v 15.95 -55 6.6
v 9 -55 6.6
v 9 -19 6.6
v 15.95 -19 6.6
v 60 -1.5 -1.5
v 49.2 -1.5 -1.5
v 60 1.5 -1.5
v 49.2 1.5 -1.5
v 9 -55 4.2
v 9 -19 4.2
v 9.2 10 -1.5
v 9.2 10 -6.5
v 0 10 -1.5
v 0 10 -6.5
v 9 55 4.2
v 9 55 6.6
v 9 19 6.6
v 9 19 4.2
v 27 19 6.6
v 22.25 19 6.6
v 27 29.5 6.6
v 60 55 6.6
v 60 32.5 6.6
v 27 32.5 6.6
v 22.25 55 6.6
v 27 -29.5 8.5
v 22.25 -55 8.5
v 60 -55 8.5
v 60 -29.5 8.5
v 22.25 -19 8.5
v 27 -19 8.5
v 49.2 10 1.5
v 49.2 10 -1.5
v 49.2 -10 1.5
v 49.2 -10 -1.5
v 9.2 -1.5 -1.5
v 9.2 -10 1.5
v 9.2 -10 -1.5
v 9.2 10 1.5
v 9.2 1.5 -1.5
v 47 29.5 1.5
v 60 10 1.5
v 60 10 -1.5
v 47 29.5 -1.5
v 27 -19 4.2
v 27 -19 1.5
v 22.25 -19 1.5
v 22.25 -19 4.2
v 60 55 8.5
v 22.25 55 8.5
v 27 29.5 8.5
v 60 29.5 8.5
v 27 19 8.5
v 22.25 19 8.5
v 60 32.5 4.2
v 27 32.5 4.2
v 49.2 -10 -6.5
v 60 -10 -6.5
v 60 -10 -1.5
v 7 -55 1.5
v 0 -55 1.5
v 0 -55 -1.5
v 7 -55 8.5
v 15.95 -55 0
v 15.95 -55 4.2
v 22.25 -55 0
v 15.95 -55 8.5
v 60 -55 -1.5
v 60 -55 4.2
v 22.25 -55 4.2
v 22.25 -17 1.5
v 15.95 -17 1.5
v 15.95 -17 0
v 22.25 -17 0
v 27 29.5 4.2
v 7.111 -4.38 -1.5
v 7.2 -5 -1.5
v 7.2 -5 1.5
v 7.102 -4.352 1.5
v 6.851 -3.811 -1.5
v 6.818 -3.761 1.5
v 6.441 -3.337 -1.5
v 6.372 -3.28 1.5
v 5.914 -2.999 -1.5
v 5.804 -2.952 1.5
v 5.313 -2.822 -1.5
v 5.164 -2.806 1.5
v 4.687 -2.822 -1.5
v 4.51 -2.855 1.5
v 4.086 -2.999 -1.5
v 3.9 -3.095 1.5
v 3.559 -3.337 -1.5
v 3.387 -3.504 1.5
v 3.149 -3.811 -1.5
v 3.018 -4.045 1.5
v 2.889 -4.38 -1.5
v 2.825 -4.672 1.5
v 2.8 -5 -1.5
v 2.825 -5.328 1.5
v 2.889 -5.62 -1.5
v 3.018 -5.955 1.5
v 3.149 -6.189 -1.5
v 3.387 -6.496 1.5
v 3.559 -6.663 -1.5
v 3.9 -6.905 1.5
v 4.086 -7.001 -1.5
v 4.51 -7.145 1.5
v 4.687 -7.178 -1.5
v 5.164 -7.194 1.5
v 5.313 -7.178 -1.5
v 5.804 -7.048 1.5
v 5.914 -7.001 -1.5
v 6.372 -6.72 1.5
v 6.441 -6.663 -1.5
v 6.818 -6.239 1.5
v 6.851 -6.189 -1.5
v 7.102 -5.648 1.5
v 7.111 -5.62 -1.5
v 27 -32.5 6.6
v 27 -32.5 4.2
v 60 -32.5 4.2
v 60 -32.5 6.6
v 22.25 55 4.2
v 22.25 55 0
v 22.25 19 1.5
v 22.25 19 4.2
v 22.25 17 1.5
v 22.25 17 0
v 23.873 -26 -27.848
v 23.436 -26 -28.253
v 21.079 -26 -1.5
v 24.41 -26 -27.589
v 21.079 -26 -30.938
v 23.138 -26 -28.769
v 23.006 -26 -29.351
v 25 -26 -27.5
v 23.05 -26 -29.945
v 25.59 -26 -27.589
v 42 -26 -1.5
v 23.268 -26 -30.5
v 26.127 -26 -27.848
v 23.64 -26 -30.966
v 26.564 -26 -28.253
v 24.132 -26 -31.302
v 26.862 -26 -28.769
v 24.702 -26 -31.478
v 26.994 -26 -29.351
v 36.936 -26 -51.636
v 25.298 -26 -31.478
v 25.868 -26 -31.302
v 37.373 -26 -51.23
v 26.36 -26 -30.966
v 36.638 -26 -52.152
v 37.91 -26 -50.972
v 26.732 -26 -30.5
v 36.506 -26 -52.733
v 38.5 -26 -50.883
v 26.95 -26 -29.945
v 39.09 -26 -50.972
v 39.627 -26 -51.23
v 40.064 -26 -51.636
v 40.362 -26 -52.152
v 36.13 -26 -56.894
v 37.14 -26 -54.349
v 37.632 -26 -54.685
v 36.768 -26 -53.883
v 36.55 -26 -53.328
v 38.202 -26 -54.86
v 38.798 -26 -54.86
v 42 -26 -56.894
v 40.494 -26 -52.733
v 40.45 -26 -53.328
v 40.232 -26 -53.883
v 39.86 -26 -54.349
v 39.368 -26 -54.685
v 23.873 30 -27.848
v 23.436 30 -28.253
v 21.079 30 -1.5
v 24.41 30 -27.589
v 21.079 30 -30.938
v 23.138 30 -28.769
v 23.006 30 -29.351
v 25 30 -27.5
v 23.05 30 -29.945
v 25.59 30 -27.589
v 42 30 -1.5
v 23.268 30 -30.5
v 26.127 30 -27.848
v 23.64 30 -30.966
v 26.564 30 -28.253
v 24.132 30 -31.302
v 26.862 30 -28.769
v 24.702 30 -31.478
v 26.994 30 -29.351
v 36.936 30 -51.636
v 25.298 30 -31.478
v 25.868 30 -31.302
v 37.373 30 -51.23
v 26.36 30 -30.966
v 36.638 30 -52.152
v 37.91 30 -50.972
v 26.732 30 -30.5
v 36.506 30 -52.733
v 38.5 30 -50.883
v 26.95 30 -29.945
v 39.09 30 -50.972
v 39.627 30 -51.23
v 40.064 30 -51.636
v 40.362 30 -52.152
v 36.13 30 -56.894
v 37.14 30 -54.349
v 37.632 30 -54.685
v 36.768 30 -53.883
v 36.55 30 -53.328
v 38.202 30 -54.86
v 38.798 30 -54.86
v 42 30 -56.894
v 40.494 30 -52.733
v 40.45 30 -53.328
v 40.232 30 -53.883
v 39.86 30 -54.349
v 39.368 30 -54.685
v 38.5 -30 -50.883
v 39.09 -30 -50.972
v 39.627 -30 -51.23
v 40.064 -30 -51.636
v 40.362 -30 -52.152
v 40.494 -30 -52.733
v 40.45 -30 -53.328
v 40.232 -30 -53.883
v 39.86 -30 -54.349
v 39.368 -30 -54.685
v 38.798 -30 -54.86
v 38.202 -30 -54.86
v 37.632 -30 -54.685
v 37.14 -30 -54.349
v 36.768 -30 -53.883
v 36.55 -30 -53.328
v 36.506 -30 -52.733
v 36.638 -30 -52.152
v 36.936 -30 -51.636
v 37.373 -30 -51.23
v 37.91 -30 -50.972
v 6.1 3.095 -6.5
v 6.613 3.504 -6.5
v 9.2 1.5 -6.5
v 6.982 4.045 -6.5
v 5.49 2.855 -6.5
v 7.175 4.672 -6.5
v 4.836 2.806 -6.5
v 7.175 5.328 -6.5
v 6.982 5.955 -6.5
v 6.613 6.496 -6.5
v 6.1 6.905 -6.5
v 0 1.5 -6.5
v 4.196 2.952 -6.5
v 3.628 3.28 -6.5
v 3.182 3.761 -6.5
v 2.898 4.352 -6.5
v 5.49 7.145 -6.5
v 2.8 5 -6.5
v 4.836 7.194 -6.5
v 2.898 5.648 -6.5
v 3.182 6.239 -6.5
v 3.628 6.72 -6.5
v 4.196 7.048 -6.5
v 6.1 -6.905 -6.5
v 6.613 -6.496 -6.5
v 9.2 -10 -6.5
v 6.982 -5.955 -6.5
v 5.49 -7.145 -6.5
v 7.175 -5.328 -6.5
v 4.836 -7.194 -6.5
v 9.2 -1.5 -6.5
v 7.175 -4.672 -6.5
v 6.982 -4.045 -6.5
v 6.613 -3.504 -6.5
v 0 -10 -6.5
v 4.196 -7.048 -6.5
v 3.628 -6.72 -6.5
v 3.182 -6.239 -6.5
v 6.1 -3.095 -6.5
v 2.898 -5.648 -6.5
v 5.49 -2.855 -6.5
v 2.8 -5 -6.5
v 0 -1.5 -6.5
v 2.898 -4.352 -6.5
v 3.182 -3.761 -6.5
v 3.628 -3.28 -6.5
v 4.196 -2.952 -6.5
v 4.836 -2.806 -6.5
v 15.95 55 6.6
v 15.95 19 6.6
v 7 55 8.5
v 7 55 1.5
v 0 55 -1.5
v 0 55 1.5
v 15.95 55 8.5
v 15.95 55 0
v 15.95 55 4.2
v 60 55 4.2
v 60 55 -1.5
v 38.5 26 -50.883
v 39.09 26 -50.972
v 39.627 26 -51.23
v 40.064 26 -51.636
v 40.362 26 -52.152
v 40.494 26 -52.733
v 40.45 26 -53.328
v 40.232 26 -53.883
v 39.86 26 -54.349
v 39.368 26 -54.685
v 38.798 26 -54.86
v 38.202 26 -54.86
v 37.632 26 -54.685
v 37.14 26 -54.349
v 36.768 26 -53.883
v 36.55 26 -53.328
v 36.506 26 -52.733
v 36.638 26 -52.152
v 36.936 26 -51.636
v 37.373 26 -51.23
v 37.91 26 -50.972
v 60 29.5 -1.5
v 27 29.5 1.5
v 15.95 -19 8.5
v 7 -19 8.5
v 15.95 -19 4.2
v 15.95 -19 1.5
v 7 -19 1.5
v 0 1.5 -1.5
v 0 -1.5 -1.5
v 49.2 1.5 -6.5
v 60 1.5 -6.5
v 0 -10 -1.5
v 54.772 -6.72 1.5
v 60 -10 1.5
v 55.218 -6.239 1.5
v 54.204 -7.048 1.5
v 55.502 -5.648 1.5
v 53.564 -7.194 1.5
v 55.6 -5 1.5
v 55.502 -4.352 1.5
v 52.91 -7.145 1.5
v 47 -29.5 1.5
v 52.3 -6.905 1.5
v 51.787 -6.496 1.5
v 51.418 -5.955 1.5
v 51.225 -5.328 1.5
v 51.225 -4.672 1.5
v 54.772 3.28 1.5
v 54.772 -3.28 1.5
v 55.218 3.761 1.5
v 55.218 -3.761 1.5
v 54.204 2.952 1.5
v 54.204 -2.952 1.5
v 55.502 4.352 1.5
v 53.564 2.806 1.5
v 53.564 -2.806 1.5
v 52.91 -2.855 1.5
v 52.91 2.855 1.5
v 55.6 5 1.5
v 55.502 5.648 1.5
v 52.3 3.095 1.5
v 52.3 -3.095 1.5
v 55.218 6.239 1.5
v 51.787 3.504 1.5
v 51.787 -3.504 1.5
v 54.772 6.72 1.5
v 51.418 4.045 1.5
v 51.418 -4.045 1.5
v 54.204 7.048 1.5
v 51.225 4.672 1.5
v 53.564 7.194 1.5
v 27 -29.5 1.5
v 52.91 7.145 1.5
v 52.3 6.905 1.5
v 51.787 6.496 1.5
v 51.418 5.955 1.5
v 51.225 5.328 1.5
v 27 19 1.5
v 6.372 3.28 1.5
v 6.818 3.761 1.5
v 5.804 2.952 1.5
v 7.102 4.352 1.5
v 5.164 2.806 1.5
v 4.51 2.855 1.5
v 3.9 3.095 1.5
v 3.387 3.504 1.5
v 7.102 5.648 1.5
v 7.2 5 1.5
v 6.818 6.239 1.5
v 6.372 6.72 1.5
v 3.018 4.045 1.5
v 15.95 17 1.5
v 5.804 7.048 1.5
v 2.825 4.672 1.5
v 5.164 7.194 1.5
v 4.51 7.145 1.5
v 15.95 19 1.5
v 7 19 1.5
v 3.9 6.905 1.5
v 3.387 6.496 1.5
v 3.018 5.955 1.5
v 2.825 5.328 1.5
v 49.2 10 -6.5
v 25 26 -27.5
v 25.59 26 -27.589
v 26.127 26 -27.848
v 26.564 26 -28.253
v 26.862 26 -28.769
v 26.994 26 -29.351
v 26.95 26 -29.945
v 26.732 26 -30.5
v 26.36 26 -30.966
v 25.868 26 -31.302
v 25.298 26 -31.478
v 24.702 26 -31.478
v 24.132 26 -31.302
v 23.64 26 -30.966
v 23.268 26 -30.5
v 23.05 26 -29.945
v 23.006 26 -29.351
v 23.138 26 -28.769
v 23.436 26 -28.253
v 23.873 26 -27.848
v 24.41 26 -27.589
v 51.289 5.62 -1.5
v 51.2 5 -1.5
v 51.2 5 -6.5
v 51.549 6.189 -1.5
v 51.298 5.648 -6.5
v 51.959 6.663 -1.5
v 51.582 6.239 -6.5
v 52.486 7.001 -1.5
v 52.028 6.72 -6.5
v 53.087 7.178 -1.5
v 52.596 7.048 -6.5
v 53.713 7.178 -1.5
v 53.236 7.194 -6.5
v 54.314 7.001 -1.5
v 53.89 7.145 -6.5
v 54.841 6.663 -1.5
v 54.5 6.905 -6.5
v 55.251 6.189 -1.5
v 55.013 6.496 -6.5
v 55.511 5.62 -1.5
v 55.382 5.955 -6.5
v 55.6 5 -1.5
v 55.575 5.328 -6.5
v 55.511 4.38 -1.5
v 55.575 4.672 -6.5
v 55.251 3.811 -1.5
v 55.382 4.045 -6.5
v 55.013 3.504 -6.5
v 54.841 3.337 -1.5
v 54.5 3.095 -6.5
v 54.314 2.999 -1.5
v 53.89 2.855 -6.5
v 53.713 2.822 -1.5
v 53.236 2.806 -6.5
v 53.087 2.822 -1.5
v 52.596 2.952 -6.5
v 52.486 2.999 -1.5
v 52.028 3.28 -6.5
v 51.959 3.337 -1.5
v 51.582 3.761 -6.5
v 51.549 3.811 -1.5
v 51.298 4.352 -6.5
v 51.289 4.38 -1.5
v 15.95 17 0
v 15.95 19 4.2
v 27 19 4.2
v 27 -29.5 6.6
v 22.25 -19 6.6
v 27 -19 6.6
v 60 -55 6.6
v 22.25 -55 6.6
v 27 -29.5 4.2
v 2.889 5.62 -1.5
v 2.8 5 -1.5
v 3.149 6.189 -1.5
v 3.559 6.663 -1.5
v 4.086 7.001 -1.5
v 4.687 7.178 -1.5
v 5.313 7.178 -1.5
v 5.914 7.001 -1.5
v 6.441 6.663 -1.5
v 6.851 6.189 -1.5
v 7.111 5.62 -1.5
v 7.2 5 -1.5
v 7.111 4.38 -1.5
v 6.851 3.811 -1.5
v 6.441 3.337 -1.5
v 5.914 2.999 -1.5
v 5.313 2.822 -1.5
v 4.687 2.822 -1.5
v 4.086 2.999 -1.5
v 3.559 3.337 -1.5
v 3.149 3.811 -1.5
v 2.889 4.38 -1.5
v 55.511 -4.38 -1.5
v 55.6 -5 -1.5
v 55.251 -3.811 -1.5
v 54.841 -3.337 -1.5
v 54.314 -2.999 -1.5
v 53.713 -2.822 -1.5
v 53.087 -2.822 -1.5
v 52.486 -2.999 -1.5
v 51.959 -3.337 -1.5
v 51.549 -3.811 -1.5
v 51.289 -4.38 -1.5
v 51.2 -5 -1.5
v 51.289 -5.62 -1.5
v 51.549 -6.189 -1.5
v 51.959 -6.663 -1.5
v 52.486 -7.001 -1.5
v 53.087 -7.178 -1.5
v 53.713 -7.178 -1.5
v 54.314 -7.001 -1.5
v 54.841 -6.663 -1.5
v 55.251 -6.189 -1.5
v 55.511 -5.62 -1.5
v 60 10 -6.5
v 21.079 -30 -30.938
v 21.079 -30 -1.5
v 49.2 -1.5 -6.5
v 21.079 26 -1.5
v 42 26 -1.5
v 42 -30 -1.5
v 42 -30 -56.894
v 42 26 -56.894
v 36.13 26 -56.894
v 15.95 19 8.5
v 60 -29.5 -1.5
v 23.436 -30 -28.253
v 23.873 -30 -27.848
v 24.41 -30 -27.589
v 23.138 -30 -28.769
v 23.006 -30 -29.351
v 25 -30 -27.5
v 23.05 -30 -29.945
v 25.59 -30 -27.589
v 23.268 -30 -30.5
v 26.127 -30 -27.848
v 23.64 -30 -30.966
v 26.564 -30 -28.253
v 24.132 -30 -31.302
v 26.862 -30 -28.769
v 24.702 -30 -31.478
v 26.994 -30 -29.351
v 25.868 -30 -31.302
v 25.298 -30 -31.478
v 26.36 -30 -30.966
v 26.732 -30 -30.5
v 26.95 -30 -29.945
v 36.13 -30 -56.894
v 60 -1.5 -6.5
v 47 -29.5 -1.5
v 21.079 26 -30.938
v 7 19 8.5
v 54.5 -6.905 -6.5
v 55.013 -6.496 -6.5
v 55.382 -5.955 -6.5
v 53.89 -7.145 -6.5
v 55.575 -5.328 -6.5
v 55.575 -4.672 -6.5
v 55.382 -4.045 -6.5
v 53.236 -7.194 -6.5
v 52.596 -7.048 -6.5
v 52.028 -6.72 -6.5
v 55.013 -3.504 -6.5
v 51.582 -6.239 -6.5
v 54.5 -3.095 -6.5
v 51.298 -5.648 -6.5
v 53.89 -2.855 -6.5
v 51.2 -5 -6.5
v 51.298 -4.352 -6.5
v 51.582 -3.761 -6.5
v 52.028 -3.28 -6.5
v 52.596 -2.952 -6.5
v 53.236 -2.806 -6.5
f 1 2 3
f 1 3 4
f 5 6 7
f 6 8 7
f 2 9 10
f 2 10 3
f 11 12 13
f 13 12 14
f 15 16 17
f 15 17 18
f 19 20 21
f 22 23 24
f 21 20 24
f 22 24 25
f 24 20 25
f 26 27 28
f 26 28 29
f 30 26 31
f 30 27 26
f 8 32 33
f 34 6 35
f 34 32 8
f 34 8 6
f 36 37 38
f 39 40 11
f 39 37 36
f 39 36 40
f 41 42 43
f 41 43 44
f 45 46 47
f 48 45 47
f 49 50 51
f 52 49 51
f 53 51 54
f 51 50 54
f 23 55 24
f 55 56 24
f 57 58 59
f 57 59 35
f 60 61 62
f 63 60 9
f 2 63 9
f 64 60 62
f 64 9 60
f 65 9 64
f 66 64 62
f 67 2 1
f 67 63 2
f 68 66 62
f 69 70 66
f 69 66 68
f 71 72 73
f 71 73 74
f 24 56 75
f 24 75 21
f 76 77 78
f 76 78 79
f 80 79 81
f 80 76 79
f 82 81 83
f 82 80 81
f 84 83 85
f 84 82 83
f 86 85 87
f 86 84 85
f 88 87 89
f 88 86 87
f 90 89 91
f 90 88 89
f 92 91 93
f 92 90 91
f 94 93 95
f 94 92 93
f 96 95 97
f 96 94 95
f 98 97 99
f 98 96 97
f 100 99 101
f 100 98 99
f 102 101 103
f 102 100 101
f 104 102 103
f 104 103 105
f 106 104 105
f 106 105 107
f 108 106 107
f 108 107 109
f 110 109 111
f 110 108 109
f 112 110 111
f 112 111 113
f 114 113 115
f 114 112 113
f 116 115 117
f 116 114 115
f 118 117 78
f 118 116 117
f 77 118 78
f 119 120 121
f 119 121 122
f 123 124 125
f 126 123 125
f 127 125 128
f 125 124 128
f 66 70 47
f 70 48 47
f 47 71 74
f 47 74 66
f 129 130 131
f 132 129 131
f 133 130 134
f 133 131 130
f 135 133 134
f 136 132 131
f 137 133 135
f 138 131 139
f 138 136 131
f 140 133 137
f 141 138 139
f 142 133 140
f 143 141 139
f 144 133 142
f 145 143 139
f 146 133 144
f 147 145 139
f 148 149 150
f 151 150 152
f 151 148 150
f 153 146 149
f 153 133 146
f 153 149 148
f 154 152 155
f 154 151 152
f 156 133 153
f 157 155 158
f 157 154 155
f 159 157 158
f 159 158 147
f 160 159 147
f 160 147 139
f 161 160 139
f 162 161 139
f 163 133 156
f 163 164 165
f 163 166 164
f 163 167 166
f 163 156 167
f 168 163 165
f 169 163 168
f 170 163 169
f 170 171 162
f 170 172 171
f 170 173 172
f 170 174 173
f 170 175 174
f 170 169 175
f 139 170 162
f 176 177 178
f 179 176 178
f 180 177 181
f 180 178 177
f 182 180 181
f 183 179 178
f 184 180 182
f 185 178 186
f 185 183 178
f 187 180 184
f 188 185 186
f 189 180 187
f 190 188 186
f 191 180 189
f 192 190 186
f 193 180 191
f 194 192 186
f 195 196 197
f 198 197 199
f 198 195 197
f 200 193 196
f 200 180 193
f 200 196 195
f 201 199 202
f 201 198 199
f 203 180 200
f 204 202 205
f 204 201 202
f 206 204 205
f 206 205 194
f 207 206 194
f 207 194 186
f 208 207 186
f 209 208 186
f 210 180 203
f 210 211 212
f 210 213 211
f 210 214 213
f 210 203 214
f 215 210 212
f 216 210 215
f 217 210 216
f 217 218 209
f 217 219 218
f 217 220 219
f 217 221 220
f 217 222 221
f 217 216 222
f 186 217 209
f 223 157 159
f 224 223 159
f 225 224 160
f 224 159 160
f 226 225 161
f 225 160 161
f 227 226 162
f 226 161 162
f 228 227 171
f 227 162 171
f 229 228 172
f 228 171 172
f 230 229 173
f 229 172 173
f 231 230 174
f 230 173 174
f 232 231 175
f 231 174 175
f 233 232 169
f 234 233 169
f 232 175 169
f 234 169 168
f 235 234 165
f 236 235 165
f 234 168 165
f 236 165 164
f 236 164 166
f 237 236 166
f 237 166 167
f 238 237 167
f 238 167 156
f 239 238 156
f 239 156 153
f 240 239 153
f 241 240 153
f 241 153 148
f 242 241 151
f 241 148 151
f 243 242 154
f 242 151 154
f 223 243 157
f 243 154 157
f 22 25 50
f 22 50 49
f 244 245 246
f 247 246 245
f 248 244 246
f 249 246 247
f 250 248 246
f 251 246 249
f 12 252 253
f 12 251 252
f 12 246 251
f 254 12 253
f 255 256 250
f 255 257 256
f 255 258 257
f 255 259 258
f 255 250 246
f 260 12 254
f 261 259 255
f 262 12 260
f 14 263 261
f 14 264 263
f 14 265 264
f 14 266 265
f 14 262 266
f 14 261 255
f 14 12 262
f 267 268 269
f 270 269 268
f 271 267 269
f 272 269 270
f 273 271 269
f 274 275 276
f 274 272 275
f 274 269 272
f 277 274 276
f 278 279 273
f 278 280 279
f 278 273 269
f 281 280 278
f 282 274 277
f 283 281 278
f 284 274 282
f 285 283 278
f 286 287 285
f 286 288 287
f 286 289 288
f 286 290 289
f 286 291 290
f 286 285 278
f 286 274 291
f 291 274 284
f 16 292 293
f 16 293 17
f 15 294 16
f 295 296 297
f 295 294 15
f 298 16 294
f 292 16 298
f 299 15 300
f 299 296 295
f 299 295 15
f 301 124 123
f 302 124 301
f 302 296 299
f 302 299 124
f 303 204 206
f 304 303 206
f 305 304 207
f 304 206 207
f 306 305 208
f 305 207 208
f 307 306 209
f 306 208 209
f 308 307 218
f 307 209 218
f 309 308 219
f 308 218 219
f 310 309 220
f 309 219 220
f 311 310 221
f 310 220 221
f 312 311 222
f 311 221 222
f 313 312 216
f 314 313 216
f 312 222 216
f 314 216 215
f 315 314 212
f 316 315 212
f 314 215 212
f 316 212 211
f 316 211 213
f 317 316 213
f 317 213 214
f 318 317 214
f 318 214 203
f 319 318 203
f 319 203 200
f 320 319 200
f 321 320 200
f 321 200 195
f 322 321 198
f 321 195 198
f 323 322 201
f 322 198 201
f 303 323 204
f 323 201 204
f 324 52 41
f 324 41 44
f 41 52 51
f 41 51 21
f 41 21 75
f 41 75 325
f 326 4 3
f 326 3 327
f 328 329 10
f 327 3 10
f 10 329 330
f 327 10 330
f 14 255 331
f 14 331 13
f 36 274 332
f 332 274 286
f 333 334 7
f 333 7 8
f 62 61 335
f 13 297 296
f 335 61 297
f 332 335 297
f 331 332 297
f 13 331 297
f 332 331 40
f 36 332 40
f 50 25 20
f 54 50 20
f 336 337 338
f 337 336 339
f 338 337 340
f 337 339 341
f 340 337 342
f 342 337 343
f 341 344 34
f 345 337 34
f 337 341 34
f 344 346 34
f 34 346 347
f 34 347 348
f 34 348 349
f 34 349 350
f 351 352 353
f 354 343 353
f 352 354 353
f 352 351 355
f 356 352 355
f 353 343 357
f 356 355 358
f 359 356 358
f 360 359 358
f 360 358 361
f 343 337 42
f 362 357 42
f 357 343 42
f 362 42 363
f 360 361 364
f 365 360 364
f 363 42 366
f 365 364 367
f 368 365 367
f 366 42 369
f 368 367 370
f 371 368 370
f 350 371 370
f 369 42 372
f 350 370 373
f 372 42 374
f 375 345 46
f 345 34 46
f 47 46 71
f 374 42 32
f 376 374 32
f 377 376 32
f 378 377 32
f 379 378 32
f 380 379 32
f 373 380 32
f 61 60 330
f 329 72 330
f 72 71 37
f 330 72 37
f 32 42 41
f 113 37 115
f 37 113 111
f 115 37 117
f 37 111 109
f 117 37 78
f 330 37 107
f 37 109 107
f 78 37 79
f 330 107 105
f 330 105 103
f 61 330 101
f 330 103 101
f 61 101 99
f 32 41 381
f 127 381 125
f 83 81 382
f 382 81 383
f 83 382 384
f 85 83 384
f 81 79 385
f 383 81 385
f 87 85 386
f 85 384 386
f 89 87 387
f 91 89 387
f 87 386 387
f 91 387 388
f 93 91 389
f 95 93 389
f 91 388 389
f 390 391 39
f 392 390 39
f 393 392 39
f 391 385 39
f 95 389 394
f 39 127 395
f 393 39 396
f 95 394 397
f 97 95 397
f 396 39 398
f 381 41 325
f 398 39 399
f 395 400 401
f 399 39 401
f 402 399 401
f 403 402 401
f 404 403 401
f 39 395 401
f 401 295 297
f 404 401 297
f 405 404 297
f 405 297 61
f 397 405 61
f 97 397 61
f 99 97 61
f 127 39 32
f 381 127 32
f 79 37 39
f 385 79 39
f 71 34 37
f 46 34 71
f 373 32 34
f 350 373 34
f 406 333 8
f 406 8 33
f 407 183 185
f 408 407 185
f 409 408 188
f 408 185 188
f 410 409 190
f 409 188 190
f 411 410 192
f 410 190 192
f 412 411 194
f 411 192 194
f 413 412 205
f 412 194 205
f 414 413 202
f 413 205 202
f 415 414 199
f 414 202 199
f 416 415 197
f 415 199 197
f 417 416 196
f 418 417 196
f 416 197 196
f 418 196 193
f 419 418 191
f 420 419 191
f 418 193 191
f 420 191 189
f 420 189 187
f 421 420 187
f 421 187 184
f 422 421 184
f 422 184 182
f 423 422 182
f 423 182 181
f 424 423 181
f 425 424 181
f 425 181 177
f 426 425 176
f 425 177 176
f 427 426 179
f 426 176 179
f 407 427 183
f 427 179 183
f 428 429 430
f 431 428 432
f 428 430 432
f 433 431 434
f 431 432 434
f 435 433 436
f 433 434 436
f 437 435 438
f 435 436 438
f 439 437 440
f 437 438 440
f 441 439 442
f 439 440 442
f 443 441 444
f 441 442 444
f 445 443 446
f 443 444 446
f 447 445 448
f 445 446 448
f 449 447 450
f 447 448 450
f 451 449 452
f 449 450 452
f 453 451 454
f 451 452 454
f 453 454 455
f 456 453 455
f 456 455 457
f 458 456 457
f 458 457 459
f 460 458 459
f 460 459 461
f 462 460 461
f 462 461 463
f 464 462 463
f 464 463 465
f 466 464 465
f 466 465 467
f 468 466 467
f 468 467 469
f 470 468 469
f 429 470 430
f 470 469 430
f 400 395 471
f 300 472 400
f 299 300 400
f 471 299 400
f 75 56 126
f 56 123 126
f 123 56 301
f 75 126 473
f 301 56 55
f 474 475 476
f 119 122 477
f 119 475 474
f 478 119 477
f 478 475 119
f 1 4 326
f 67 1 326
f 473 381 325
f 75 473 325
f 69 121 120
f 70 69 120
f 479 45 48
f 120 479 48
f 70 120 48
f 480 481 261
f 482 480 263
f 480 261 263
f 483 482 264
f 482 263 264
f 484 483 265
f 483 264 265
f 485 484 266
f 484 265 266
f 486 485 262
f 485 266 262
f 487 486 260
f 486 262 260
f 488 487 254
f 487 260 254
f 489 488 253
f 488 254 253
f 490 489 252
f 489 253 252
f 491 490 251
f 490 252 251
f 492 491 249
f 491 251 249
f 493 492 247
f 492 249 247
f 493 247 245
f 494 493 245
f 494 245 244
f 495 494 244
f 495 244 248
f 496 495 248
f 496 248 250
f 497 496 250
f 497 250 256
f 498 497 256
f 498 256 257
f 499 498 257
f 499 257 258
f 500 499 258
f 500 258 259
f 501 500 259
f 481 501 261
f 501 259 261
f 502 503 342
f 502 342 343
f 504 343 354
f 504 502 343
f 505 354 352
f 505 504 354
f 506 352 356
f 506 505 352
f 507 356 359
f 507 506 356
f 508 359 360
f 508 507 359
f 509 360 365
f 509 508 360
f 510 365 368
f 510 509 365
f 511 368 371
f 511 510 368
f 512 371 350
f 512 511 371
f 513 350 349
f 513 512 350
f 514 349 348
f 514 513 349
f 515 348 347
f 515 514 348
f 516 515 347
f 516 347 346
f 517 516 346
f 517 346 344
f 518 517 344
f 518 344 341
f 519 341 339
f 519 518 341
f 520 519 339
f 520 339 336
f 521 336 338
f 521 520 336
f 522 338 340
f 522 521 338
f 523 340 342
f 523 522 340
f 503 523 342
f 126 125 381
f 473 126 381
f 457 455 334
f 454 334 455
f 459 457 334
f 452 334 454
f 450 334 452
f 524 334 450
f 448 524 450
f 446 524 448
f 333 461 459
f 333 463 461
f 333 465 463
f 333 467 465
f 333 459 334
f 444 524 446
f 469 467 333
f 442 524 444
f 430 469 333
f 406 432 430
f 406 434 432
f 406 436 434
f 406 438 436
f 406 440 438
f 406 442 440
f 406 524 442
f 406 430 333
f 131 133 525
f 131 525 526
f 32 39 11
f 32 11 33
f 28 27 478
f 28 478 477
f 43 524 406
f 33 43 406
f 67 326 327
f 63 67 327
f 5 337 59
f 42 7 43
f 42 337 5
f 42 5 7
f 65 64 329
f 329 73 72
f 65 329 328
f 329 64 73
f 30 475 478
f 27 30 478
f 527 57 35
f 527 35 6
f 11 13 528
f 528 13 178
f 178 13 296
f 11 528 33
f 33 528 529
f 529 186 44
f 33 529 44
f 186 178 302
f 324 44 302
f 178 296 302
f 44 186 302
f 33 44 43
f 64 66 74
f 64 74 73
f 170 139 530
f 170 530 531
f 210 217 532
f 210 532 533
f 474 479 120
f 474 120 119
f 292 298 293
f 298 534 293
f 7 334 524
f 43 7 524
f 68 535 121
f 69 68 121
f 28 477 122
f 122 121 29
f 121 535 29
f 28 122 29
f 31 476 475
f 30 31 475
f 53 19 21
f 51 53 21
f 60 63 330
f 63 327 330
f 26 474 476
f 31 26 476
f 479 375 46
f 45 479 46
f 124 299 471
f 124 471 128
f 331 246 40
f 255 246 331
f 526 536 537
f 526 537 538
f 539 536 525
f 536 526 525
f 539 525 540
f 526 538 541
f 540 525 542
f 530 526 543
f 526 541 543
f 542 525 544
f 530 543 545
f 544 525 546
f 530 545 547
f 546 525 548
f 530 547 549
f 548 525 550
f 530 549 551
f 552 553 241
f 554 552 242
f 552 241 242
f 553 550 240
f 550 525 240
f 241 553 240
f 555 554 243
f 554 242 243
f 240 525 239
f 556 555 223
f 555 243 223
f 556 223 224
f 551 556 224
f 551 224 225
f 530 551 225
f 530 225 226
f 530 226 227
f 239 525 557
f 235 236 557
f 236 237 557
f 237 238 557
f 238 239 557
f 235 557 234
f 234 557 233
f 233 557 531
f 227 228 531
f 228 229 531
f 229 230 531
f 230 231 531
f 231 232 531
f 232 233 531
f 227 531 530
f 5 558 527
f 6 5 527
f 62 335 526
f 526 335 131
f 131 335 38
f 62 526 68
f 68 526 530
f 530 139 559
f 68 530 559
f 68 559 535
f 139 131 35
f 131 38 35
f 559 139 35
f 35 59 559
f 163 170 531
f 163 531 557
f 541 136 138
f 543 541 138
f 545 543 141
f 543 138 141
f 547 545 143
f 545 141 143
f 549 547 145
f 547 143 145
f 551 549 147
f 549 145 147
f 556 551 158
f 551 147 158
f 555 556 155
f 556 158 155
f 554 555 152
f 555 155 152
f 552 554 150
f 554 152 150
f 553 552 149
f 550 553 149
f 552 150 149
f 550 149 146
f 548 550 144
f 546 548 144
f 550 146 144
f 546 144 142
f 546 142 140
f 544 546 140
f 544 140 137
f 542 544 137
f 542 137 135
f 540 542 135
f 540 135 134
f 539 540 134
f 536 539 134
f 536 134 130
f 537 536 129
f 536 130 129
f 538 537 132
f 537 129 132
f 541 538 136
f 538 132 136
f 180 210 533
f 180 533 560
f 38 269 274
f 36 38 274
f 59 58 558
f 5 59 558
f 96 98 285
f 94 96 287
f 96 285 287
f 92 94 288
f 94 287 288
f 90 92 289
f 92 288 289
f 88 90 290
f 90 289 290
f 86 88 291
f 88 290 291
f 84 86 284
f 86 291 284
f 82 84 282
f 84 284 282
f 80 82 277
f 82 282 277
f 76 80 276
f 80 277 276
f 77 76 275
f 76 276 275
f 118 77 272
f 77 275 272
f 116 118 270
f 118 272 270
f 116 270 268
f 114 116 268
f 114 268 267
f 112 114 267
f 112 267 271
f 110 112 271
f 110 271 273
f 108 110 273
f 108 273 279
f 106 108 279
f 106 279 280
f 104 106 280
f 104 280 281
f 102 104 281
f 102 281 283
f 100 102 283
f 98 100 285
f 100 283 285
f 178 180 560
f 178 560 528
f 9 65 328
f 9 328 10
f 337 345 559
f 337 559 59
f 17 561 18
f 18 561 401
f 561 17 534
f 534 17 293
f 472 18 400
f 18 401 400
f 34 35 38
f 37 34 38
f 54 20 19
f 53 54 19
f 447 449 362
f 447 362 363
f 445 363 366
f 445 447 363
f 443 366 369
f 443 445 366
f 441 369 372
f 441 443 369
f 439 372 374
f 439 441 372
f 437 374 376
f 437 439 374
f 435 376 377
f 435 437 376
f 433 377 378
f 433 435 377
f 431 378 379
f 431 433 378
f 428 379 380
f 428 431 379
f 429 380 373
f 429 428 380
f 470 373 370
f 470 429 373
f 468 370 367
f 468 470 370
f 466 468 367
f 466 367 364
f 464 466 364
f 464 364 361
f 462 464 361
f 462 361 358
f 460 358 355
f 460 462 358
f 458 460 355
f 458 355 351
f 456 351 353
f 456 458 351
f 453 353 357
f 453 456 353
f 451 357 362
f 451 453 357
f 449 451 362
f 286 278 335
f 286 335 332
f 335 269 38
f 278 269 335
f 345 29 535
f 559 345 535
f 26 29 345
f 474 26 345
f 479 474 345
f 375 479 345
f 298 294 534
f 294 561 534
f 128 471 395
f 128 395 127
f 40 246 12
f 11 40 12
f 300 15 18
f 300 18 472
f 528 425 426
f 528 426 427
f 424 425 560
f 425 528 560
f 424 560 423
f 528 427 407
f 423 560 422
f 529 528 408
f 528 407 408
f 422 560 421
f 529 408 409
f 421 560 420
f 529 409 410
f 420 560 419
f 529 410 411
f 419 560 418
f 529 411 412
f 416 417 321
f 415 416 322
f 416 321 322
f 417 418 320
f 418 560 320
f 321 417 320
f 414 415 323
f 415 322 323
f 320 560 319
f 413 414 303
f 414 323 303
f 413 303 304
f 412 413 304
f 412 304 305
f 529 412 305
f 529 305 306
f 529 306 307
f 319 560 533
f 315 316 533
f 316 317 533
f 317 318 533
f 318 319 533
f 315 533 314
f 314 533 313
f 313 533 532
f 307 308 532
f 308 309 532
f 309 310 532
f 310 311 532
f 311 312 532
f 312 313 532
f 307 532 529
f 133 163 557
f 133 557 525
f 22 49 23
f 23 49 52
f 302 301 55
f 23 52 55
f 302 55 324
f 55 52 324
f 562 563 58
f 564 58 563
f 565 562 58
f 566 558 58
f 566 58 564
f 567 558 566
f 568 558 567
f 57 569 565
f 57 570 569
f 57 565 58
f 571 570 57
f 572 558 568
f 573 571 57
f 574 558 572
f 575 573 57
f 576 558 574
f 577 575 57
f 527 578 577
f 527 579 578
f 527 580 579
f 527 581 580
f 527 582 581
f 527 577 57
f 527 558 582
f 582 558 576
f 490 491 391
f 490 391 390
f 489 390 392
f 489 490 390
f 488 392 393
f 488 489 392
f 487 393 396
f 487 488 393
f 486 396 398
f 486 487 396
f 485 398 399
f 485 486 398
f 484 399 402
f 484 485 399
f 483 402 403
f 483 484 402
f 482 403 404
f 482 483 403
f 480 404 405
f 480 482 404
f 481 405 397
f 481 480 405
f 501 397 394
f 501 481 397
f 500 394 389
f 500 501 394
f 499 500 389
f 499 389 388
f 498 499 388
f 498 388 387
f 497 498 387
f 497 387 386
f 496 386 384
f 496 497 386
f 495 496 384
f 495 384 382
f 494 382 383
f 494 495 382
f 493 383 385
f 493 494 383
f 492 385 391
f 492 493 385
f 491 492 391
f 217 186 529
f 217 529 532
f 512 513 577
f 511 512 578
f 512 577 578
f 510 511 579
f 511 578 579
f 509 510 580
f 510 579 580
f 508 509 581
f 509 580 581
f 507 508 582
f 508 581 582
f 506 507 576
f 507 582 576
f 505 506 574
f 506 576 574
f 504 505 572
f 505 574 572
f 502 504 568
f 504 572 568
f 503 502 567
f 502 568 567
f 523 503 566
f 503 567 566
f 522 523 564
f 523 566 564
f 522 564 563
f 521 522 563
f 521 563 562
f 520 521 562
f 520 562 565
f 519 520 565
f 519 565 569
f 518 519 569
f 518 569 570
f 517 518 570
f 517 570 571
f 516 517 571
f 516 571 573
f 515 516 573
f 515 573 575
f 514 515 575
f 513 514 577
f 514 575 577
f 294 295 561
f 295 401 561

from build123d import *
from build123d.topology import SkipClean

# Parameters (mm, degrees)
SKETCH_1_R               = 2.2
EXTRUDE_1_DEPTH          = 1.5
EXTRUDE_START            = -1.5
EXTRUDE_2_DEPTH          = 10
SKETCH_2_W               = 6.3
SKETCH_2_H               = 7
CUT_EXTRUDE_1_DEPTH      = 80
CUT_EXTRUDE_START        = -2
SKETCH_3_W               = 2.4
SKETCH_3_H               = 19
CUT_EXTRUDE_2_DEPTH      = 80
EXTRUDE_3_DEPTH          = 10
SKETCH_4_W               = 17.75
SKETCH_4_H               = 2.4
CUT_EXTRUDE_3_DEPTH      = 12.5
CUT_EXTRUDE_START_2      = -90
SKETCH_4_2_W             = 17.75
SKETCH_4_2_H             = 2.4
CUT_EXTRUDE_4_DEPTH      = 12.5
EXTRUDE_START_2          = -15
SKETCH_6_R               = 2
EXTRUDE_4_DEPTH          = 4
EXTRUDE_START_3          = -71
SKETCH_6_2_R             = 2
EXTRUDE_5_DEPTH          = 4
CUT_EXTRUDE_START_3      = 60
SKETCH_7_W               = 6.95
SKETCH_7_H               = 2.4
CUT_EXTRUDE_5_DEPTH      = 90
SKETCH_9_W               = 6.3
SKETCH_9_H               = 1.5
CUT_EXTRUDE_7_DEPTH      = 23
SKETCH_10_W              = 6.3
SKETCH_10_H              = 1.5
CUT_EXTRUDE_8_DEPTH      = 23
CUT_EXTRUDE_9_DEPTH      = 70
CUT_EXTRUDE_9_DEPTH_BACK = 30
SKETCH_11_W              = 2.75
SKETCH_11_H              = 2.4
EXTRUDE_6_DEPTH          = 20
EXTRUDE_7_DEPTH          = 20
SKETCH_15_W              = 37.75
SKETCH_15_H              = 1.9
EXTRUDE_8_DEPTH          = 15
SKETCH_16_W              = 37.75
SKETCH_16_H              = 1.9
EXTRUDE_9_DEPTH          = 15
EXTRUDE_START_4          = 5
SKETCH_17_W              = 10.8
SKETCH_17_H              = 8.5
SKETCH_17_R              = 2.2
SKETCH_17_W_2            = 9.2
EXTRUDE_10_DEPTH         = 5


with BuildPart() as part:
    # 草图1 → 凸台-拉伸1 (new, symmetric)
    with BuildSketch(Plane.XY):
        Polygon((15.95, 38), (15.95, 19), (7, 19), (7, 40), (0, 40), (0, -40), (7, -40), (7, -19), (15.95, -19), (15.95, -38), (22.25, -38), (22.25, -19), (24.25, -19), (27, -19), (27, -29.5), (40, -29.5), (40, -40), (60, -10), (60, 10), (40, 40), (40, 29.5), (27, 29.5), (27, 19), (24.25, 19), (22.25, 19), (22.25, 38), align=None)
        with Locations((5, -5)):
            Circle(SKETCH_1_R, mode=Mode.SUBTRACT)
        with Locations((53.4, -5)):
            Circle(SKETCH_1_R, mode=Mode.SUBTRACT)
        with Locations((5, 5)):
            Circle(SKETCH_1_R, mode=Mode.SUBTRACT)
        Polygon((16, 10), (23, 10), (49.2, 10), (49.2, -10), (23, -10), (16, -10), (9.2, -10), (9.2, 10), align=None, mode=Mode.SUBTRACT)
        with Locations((53.4, 5)):
            Circle(SKETCH_1_R, mode=Mode.SUBTRACT)
    extrude(amount=EXTRUDE_1_DEPTH, both=True)

    # 草图1<3> → 凸台-拉伸2 (add)
    with BuildSketch(Plane.XY.offset(EXTRUDE_START)):
        Polygon((7, 19), (15.95, 19), (15.95, 38), (22.25, 38), (22.25, 19), (24.25, 19), (24.25, 40), (22.25, 40), (16.15, 40), (7, 40), align=None)
        Polygon((7, -19), (7, -40), (16.15, -40), (22.25, -40), (24.25, -40), (24.25, -19), (22.25, -19), (22.25, -38), (15.95, -38), (15.95, -19), align=None)
    extrude(amount=EXTRUDE_2_DEPTH)

    # 草图2 → 切除-拉伸1 (cut)
    with BuildSketch(Plane.XZ.offset(40)):
        with Locations((19.1, 5)):
            Rectangle(SKETCH_2_W, SKETCH_2_H)
    extrude(amount=-CUT_EXTRUDE_1_DEPTH, mode=Mode.SUBTRACT)

    # 草图3 → 切除-拉伸2 (cut)
    with BuildSketch(Plane.ZY.offset(-7).offset(CUT_EXTRUDE_START)):
        with Locations((5.4, -28.5)):
            Rectangle(SKETCH_3_W, SKETCH_3_H)
        with Locations((5.4, 28.5)):
            Rectangle(SKETCH_3_W, SKETCH_3_H)
    extrude(amount=-CUT_EXTRUDE_2_DEPTH, mode=Mode.SUBTRACT)

    # 草图1<4> → 凸台-拉伸3 (add)
    with BuildSketch(Plane.XY.offset(EXTRUDE_START)):
        Polygon((24.25, 45), (24.25, 19), (27, 19), (27, 29.5), (40, 29.5), (40, 45), align=None)
        Polygon((24.25, -19), (24.25, -45), (40, -45), (40, -29.5), (27, -29.5), (27, -19), align=None)
    extrude(amount=EXTRUDE_3_DEPTH)

    # 草图4 → 切除-拉伸3 (cut)
    with BuildSketch(Plane.XZ.offset(45)):
        with Locations((31.125, 5.4)):
            Rectangle(SKETCH_4_W, SKETCH_4_H)
    extrude(amount=-CUT_EXTRUDE_3_DEPTH, mode=Mode.SUBTRACT)

    # 草图4<2> → 切除-拉伸4 (cut)
    with BuildSketch(Plane.XZ.offset(45).offset(CUT_EXTRUDE_START_2)):
        with Locations((31.125, 5.4)):
            Rectangle(SKETCH_4_2_W, SKETCH_4_2_H)
    extrude(amount=CUT_EXTRUDE_4_DEPTH, mode=Mode.SUBTRACT)

    # 草图6 → 凸台-拉伸4 (add)
    with BuildSketch(Plane(origin=(0, 45, 0), x_dir=(1, 0, 0), z_dir=(0, 1, 0)).offset(EXTRUDE_START_2)):
        Polygon((21.0788144, 1.5), (42, 1.5), (42, 7.5), (42, 56.89407293), (36.129535456, 56.89407293), (21.0788144, 30.93796809), align=None)
        with Locations(Location((25, 29.5, 0), (0, 0, 270))):
            Circle(SKETCH_6_R, mode=Mode.SUBTRACT)
        with Locations(Location((38.5, 52.8826859, 0), (0, 0, 270))):
            Circle(SKETCH_6_R, mode=Mode.SUBTRACT)
    extrude(amount=-EXTRUDE_4_DEPTH)

    # 草图6<2> → 凸台-拉伸5 (add)
    with BuildSketch(Plane(origin=(0, 45, 0), x_dir=(1, 0, 0), z_dir=(0, 1, 0)).offset(EXTRUDE_START_3)):
        Polygon((21.0788144, 1.5), (42, 1.5), (42, 7.5), (42, 56.89407293), (36.129535456, 56.89407293), (21.0788144, 30.93796809), align=None)
        with Locations(Location((25, 29.5, 0), (0, 0, 270))):
            Circle(SKETCH_6_2_R, mode=Mode.SUBTRACT)
        with Locations(Location((38.5, 52.8826859, 0), (0, 0, 270))):
            Circle(SKETCH_6_2_R, mode=Mode.SUBTRACT)
    extrude(amount=-EXTRUDE_5_DEPTH)

    # 草图7 → 切除-拉伸5 (cut)
    with BuildSketch(Plane.XZ.offset(-19).offset(CUT_EXTRUDE_START_3)):
        with Locations((12.475, 5.4)):
            Rectangle(SKETCH_7_W, SKETCH_7_H)
    extrude(amount=-CUT_EXTRUDE_5_DEPTH, mode=Mode.SUBTRACT)

    # 草图9 → 切除-拉伸7 (cut)
    with BuildSketch(Plane(origin=(0, 40, 0), x_dir=(1, 0, 0), z_dir=(0, 1, 0))):
        with Locations((19.1, -0.75)):
            Rectangle(SKETCH_9_W, SKETCH_9_H)
    extrude(amount=-CUT_EXTRUDE_7_DEPTH, mode=Mode.SUBTRACT)

    # 草图10 → 切除-拉伸8 (cut)
    with BuildSketch(Plane.XZ.offset(40)):
        with Locations((19.1, 0.75)):
            Rectangle(SKETCH_10_W, SKETCH_10_H)
    extrude(amount=-CUT_EXTRUDE_8_DEPTH, mode=Mode.SUBTRACT)

    # 草图11 → 切除-拉伸9 (cut, two sides: drawn at the far end of the back side and taken through both)
    with BuildSketch(Plane.XZ.offset(-19).offset(-CUT_EXTRUDE_9_DEPTH_BACK)):
        with Locations((25.625, 5.4)):
            Rectangle(SKETCH_11_W, SKETCH_11_H)
    extrude(amount=CUT_EXTRUDE_9_DEPTH + CUT_EXTRUDE_9_DEPTH_BACK, mode=Mode.SUBTRACT)

    # 草图12 → 凸台-拉伸6 (add)
    with BuildSketch(Plane(origin=(40, 0, 0), x_dir=(0, 0, -1), z_dir=(1, 0, 0))):
        Polygon((-8.5, -45), (-8.5, -29.5), (1.5, -29.5), (1.5, -45), (-4.2, -45), (-4.2, -32.5), (-6.6, -32.5), (-6.6, -45), align=None)
    extrude(amount=EXTRUDE_6_DEPTH)

    # 草图13 → 凸台-拉伸7 (add)
    with BuildSketch(Plane(origin=(40, 0, 0), x_dir=(0, 0, -1), z_dir=(1, 0, 0))):
        Polygon((-8.5, 45), (-8.5, 29.5), (1.5, 29.5), (1.5, 45), (-4.2, 45), (-4.2, 32.5), (-6.6, 32.5), (-6.6, 45), align=None)
    extrude(amount=EXTRUDE_7_DEPTH)

    # 草图15 → 凸台-拉伸8 (add)
    with BuildSketch(Plane(origin=(0, 40, 0), x_dir=(1, 0, 0), z_dir=(0, 1, 0))):
        Polygon((0, -1.5), (7, -1.5), (7, -8.5), (15.95, -8.5), (15.95, -6.6), (9, -6.6), (9, -4.2), (15.95, -4.2), (15.95, 0), (22.25, 0), (22.25, -4.2), (60, -4.2), (60, 1.5), (0, 1.5), align=None)
        with Locations((41.125, -7.55)):
            Rectangle(SKETCH_15_W, SKETCH_15_H)
    extrude(amount=EXTRUDE_8_DEPTH)

    # 草图16 → 凸台-拉伸9 (add)
    with BuildSketch(Plane.XZ.offset(40)):
        Polygon((15.95, 8.5), (7, 8.5), (7, 1.5), (0, 1.5), (0, -1.5), (60, -1.5), (60, 4.2), (22.25, 4.2), (22.25, 0), (15.95, 0), (15.95, 4.2), (9, 4.2), (9, 6.6), (15.95, 6.6), align=None)
        with Locations((41.125, 7.55)):
            Rectangle(SKETCH_16_W, SKETCH_16_H)
    extrude(amount=EXTRUDE_9_DEPTH)

    # 草图17 → 凸台-拉伸10 (add)
    # profile 1 of 4: a face of its own
    with SkipClean():  # the faces are left unmerged after this step: merging them gives an invalid solid
        with BuildSketch(Plane(origin=(0, 0, -1.5), x_dir=(-1, 0, 0), z_dir=(0, 0, -1)).offset(EXTRUDE_START_4)):
            with Locations((-54.6, -5.75)):
                Rectangle(SKETCH_17_W, SKETCH_17_H)
            with Locations((-53.4, -5)):
                Circle(SKETCH_17_R, mode=Mode.SUBTRACT)
        # profile 2 of 4: a face of its own
        with BuildSketch(Plane(origin=(0, 0, -1.5), x_dir=(-1, 0, 0), z_dir=(0, 0, -1)).offset(EXTRUDE_START_4)):
            with Locations((-54.6, 5.75)):
                Rectangle(SKETCH_17_W, SKETCH_17_H)
            with Locations((-53.4, 5)):
                Circle(SKETCH_17_R, mode=Mode.SUBTRACT)
        # profile 3 of 4: a face of its own
        with BuildSketch(Plane(origin=(0, 0, -1.5), x_dir=(-1, 0, 0), z_dir=(0, 0, -1)).offset(EXTRUDE_START_4)):
            with Locations((-4.6, -5.75)):
                Rectangle(SKETCH_17_W_2, SKETCH_17_H)
            with Locations((-5, -5)):
                Circle(SKETCH_17_R, mode=Mode.SUBTRACT)
        # profile 4 of 4: a face of its own
        with BuildSketch(Plane(origin=(0, 0, -1.5), x_dir=(-1, 0, 0), z_dir=(0, 0, -1)).offset(EXTRUDE_START_4)):
            with Locations((-4.6, 5.75)):
                Rectangle(SKETCH_17_W_2, SKETCH_17_H)
            with Locations((-5, 5)):
                Circle(SKETCH_17_R, mode=Mode.SUBTRACT)
        extrude(amount=-EXTRUDE_10_DEPTH)


solid = part.part
